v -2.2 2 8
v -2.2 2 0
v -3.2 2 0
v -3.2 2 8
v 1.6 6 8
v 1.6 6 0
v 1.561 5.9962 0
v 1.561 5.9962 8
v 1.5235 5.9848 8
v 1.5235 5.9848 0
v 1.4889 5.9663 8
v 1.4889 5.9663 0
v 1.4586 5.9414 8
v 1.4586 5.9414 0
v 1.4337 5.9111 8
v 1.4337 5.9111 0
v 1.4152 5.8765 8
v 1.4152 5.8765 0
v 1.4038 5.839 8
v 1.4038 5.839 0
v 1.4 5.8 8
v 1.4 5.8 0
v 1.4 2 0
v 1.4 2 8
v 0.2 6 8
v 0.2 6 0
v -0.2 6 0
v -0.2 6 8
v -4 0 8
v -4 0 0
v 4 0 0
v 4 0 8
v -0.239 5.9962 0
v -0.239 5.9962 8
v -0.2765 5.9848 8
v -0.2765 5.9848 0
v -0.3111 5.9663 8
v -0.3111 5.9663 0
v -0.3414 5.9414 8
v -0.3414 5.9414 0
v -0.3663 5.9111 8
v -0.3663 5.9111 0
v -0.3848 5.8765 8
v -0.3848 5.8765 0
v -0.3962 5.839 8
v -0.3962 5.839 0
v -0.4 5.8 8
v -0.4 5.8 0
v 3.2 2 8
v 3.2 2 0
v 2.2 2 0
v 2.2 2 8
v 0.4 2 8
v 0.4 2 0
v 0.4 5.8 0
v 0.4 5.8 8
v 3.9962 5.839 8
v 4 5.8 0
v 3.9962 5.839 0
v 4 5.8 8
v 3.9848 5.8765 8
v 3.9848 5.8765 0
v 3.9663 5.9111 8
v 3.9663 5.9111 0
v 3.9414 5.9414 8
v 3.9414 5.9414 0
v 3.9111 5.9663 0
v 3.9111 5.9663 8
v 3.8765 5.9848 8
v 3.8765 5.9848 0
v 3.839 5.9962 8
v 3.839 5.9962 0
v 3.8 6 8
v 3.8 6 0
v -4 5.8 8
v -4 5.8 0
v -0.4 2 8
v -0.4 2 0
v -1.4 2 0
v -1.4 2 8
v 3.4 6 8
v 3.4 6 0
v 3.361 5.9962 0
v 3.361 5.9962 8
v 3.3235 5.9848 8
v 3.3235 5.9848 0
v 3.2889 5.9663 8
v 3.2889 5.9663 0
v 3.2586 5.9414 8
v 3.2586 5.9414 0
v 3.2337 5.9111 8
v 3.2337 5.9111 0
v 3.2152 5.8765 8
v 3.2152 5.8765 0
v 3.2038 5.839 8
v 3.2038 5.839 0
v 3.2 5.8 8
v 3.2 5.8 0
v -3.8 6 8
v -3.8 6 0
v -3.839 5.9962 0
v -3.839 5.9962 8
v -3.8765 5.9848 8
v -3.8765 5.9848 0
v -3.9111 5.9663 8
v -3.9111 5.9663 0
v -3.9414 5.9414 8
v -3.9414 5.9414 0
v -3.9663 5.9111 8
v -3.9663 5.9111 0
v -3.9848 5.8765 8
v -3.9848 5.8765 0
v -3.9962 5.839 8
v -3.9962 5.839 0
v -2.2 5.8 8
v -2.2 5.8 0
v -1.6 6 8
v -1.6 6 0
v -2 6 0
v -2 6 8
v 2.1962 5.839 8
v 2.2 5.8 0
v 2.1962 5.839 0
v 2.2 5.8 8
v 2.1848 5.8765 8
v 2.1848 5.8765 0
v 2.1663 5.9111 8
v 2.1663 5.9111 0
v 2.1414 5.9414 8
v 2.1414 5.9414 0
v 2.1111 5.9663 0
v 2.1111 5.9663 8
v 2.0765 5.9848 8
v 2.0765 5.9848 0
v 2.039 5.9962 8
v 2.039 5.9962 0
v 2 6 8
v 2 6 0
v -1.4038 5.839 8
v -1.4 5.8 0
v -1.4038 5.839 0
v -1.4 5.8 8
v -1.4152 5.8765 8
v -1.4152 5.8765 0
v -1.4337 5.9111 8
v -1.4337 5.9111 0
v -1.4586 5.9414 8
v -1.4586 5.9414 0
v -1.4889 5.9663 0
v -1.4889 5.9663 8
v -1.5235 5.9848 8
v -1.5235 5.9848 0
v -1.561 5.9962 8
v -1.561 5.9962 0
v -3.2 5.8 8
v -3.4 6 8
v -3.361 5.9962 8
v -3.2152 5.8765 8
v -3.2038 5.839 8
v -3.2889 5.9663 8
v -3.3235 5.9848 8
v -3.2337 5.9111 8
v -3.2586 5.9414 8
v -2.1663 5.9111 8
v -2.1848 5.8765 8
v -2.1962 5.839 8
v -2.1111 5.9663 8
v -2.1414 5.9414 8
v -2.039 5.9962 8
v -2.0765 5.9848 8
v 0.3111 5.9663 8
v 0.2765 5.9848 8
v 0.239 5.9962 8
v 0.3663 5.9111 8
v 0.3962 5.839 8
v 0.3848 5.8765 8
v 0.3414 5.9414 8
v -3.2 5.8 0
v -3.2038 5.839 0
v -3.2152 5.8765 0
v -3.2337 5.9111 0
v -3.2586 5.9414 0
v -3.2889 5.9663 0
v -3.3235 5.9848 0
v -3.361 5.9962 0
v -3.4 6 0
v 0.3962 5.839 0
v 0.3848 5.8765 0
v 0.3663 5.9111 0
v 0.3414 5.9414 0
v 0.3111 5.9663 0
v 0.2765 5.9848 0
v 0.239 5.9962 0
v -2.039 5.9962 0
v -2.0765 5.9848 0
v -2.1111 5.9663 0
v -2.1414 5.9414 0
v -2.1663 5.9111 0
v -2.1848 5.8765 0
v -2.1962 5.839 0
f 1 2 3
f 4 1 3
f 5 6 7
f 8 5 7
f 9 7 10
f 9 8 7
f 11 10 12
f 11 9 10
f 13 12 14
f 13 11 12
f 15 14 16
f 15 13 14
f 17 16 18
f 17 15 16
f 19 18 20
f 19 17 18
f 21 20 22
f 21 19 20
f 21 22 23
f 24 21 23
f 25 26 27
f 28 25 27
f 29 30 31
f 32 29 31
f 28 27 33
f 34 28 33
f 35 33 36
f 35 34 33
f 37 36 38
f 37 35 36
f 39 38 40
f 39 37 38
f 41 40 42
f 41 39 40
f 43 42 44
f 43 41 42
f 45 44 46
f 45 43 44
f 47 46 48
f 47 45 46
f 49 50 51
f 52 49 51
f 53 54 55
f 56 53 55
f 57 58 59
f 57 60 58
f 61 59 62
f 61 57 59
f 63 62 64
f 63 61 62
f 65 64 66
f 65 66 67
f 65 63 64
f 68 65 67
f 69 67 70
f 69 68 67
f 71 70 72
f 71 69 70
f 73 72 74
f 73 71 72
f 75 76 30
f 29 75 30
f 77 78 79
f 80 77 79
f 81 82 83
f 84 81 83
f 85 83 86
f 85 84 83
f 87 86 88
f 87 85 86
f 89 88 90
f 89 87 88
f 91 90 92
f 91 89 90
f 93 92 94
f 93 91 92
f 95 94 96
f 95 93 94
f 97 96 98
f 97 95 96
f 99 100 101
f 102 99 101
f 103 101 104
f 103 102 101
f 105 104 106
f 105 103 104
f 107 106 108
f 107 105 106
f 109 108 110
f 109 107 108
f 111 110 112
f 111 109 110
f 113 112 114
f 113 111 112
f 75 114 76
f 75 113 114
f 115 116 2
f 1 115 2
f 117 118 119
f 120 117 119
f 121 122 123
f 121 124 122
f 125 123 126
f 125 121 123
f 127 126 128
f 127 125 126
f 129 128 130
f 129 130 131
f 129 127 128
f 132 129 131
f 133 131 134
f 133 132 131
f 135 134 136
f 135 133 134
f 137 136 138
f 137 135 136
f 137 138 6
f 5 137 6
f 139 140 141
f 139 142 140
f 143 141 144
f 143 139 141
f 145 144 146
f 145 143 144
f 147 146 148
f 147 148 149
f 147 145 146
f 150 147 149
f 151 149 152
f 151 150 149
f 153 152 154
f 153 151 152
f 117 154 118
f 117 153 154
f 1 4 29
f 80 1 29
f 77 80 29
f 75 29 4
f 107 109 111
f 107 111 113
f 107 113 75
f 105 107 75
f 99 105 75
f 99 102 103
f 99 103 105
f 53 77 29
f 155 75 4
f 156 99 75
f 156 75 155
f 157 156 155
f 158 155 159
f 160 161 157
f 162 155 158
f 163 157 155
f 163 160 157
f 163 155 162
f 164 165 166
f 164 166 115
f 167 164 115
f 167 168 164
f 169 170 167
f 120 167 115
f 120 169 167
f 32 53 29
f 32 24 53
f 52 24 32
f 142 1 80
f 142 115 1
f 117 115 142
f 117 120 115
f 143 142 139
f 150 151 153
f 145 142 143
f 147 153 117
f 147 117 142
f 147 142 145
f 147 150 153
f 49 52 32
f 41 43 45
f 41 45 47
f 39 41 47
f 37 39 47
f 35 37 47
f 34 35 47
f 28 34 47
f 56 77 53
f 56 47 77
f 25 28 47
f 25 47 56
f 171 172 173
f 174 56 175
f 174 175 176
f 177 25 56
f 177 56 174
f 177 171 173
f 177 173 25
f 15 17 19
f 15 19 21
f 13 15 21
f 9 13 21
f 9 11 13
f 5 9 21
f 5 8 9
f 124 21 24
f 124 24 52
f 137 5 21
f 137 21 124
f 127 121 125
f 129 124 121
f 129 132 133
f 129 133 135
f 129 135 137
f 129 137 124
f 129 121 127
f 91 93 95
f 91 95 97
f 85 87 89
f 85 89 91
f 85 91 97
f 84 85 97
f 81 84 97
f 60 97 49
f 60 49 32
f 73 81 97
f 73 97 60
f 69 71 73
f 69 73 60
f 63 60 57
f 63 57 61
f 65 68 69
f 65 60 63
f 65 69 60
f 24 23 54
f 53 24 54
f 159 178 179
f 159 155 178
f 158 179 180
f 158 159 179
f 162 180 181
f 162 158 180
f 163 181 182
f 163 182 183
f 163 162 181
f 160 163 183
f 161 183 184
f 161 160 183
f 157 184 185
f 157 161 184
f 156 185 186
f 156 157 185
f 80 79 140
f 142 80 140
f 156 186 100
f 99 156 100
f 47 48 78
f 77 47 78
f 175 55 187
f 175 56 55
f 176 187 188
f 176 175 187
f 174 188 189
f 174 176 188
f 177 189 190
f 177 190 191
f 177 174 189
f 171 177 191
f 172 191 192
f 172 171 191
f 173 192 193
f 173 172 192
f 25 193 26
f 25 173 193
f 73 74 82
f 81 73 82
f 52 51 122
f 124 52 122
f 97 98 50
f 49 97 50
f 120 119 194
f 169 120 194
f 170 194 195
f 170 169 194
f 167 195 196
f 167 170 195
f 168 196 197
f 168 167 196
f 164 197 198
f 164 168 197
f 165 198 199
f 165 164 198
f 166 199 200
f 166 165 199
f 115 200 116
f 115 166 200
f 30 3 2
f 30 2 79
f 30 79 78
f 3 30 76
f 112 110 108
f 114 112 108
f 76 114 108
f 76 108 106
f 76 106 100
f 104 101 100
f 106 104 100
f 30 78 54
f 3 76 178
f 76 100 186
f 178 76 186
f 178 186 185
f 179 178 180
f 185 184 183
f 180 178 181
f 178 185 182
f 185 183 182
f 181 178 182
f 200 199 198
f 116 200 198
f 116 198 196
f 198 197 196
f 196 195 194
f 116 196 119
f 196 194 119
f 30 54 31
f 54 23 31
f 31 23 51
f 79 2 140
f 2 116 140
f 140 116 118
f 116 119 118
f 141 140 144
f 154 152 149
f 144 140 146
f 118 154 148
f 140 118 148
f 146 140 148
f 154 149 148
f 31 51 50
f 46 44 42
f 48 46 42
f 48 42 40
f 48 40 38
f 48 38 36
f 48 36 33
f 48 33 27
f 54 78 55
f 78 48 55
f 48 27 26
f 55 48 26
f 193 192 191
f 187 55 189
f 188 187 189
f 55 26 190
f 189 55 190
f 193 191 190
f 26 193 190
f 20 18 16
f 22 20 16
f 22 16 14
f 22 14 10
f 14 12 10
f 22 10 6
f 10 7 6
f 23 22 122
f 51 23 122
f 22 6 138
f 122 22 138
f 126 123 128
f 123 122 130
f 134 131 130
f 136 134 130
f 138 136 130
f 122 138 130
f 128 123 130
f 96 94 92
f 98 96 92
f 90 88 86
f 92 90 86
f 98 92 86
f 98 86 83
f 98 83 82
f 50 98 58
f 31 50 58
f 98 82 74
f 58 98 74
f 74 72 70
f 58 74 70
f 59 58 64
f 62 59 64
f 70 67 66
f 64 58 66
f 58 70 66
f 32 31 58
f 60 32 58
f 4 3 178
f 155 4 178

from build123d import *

# Parameters (mm, degrees)
BOSS_EXTRUDE1_DEPTH = 8
FILLET1_R           = 0.2


with BuildPart() as part:
    # Sketch1 → Boss-Extrude1 (new body)
    with BuildSketch(Plane.XY):
        Polygon((-4, 0), (4, 0), (4, 6), (3.2, 6), (3.2, 2), (2.2, 2), (2.2, 6), (1.4, 6), (1.4, 2), (0.4, 2), (0.4, 6), (-0.4, 6), (-0.4, 2), (-1.4, 2), (-1.4, 6), (-2.2, 6), (-2.2, 2), (-3.2, 2), (-3.2, 6), (-4, 6), align=None)
    extrude(amount=BOSS_EXTRUDE1_DEPTH)

    # Fillet1
    fillet1_edges = [part.edges().sort_by_distance(p)[0] for p in [
        (-4, 6, 4),
        (-3.2, 6, 4),
        (-2.2, 6, 4),
        (-1.4, 6, 4),
        (-0.4, 6, 4),
        (0.4, 6, 4),
        (1.4, 6, 4),
        (2.2, 6, 4),
        (3.2, 6, 4),
        (4, 6, 4),
    ]]
    fillet(fillet1_edges, radius=FILLET1_R)


solid = part.part
